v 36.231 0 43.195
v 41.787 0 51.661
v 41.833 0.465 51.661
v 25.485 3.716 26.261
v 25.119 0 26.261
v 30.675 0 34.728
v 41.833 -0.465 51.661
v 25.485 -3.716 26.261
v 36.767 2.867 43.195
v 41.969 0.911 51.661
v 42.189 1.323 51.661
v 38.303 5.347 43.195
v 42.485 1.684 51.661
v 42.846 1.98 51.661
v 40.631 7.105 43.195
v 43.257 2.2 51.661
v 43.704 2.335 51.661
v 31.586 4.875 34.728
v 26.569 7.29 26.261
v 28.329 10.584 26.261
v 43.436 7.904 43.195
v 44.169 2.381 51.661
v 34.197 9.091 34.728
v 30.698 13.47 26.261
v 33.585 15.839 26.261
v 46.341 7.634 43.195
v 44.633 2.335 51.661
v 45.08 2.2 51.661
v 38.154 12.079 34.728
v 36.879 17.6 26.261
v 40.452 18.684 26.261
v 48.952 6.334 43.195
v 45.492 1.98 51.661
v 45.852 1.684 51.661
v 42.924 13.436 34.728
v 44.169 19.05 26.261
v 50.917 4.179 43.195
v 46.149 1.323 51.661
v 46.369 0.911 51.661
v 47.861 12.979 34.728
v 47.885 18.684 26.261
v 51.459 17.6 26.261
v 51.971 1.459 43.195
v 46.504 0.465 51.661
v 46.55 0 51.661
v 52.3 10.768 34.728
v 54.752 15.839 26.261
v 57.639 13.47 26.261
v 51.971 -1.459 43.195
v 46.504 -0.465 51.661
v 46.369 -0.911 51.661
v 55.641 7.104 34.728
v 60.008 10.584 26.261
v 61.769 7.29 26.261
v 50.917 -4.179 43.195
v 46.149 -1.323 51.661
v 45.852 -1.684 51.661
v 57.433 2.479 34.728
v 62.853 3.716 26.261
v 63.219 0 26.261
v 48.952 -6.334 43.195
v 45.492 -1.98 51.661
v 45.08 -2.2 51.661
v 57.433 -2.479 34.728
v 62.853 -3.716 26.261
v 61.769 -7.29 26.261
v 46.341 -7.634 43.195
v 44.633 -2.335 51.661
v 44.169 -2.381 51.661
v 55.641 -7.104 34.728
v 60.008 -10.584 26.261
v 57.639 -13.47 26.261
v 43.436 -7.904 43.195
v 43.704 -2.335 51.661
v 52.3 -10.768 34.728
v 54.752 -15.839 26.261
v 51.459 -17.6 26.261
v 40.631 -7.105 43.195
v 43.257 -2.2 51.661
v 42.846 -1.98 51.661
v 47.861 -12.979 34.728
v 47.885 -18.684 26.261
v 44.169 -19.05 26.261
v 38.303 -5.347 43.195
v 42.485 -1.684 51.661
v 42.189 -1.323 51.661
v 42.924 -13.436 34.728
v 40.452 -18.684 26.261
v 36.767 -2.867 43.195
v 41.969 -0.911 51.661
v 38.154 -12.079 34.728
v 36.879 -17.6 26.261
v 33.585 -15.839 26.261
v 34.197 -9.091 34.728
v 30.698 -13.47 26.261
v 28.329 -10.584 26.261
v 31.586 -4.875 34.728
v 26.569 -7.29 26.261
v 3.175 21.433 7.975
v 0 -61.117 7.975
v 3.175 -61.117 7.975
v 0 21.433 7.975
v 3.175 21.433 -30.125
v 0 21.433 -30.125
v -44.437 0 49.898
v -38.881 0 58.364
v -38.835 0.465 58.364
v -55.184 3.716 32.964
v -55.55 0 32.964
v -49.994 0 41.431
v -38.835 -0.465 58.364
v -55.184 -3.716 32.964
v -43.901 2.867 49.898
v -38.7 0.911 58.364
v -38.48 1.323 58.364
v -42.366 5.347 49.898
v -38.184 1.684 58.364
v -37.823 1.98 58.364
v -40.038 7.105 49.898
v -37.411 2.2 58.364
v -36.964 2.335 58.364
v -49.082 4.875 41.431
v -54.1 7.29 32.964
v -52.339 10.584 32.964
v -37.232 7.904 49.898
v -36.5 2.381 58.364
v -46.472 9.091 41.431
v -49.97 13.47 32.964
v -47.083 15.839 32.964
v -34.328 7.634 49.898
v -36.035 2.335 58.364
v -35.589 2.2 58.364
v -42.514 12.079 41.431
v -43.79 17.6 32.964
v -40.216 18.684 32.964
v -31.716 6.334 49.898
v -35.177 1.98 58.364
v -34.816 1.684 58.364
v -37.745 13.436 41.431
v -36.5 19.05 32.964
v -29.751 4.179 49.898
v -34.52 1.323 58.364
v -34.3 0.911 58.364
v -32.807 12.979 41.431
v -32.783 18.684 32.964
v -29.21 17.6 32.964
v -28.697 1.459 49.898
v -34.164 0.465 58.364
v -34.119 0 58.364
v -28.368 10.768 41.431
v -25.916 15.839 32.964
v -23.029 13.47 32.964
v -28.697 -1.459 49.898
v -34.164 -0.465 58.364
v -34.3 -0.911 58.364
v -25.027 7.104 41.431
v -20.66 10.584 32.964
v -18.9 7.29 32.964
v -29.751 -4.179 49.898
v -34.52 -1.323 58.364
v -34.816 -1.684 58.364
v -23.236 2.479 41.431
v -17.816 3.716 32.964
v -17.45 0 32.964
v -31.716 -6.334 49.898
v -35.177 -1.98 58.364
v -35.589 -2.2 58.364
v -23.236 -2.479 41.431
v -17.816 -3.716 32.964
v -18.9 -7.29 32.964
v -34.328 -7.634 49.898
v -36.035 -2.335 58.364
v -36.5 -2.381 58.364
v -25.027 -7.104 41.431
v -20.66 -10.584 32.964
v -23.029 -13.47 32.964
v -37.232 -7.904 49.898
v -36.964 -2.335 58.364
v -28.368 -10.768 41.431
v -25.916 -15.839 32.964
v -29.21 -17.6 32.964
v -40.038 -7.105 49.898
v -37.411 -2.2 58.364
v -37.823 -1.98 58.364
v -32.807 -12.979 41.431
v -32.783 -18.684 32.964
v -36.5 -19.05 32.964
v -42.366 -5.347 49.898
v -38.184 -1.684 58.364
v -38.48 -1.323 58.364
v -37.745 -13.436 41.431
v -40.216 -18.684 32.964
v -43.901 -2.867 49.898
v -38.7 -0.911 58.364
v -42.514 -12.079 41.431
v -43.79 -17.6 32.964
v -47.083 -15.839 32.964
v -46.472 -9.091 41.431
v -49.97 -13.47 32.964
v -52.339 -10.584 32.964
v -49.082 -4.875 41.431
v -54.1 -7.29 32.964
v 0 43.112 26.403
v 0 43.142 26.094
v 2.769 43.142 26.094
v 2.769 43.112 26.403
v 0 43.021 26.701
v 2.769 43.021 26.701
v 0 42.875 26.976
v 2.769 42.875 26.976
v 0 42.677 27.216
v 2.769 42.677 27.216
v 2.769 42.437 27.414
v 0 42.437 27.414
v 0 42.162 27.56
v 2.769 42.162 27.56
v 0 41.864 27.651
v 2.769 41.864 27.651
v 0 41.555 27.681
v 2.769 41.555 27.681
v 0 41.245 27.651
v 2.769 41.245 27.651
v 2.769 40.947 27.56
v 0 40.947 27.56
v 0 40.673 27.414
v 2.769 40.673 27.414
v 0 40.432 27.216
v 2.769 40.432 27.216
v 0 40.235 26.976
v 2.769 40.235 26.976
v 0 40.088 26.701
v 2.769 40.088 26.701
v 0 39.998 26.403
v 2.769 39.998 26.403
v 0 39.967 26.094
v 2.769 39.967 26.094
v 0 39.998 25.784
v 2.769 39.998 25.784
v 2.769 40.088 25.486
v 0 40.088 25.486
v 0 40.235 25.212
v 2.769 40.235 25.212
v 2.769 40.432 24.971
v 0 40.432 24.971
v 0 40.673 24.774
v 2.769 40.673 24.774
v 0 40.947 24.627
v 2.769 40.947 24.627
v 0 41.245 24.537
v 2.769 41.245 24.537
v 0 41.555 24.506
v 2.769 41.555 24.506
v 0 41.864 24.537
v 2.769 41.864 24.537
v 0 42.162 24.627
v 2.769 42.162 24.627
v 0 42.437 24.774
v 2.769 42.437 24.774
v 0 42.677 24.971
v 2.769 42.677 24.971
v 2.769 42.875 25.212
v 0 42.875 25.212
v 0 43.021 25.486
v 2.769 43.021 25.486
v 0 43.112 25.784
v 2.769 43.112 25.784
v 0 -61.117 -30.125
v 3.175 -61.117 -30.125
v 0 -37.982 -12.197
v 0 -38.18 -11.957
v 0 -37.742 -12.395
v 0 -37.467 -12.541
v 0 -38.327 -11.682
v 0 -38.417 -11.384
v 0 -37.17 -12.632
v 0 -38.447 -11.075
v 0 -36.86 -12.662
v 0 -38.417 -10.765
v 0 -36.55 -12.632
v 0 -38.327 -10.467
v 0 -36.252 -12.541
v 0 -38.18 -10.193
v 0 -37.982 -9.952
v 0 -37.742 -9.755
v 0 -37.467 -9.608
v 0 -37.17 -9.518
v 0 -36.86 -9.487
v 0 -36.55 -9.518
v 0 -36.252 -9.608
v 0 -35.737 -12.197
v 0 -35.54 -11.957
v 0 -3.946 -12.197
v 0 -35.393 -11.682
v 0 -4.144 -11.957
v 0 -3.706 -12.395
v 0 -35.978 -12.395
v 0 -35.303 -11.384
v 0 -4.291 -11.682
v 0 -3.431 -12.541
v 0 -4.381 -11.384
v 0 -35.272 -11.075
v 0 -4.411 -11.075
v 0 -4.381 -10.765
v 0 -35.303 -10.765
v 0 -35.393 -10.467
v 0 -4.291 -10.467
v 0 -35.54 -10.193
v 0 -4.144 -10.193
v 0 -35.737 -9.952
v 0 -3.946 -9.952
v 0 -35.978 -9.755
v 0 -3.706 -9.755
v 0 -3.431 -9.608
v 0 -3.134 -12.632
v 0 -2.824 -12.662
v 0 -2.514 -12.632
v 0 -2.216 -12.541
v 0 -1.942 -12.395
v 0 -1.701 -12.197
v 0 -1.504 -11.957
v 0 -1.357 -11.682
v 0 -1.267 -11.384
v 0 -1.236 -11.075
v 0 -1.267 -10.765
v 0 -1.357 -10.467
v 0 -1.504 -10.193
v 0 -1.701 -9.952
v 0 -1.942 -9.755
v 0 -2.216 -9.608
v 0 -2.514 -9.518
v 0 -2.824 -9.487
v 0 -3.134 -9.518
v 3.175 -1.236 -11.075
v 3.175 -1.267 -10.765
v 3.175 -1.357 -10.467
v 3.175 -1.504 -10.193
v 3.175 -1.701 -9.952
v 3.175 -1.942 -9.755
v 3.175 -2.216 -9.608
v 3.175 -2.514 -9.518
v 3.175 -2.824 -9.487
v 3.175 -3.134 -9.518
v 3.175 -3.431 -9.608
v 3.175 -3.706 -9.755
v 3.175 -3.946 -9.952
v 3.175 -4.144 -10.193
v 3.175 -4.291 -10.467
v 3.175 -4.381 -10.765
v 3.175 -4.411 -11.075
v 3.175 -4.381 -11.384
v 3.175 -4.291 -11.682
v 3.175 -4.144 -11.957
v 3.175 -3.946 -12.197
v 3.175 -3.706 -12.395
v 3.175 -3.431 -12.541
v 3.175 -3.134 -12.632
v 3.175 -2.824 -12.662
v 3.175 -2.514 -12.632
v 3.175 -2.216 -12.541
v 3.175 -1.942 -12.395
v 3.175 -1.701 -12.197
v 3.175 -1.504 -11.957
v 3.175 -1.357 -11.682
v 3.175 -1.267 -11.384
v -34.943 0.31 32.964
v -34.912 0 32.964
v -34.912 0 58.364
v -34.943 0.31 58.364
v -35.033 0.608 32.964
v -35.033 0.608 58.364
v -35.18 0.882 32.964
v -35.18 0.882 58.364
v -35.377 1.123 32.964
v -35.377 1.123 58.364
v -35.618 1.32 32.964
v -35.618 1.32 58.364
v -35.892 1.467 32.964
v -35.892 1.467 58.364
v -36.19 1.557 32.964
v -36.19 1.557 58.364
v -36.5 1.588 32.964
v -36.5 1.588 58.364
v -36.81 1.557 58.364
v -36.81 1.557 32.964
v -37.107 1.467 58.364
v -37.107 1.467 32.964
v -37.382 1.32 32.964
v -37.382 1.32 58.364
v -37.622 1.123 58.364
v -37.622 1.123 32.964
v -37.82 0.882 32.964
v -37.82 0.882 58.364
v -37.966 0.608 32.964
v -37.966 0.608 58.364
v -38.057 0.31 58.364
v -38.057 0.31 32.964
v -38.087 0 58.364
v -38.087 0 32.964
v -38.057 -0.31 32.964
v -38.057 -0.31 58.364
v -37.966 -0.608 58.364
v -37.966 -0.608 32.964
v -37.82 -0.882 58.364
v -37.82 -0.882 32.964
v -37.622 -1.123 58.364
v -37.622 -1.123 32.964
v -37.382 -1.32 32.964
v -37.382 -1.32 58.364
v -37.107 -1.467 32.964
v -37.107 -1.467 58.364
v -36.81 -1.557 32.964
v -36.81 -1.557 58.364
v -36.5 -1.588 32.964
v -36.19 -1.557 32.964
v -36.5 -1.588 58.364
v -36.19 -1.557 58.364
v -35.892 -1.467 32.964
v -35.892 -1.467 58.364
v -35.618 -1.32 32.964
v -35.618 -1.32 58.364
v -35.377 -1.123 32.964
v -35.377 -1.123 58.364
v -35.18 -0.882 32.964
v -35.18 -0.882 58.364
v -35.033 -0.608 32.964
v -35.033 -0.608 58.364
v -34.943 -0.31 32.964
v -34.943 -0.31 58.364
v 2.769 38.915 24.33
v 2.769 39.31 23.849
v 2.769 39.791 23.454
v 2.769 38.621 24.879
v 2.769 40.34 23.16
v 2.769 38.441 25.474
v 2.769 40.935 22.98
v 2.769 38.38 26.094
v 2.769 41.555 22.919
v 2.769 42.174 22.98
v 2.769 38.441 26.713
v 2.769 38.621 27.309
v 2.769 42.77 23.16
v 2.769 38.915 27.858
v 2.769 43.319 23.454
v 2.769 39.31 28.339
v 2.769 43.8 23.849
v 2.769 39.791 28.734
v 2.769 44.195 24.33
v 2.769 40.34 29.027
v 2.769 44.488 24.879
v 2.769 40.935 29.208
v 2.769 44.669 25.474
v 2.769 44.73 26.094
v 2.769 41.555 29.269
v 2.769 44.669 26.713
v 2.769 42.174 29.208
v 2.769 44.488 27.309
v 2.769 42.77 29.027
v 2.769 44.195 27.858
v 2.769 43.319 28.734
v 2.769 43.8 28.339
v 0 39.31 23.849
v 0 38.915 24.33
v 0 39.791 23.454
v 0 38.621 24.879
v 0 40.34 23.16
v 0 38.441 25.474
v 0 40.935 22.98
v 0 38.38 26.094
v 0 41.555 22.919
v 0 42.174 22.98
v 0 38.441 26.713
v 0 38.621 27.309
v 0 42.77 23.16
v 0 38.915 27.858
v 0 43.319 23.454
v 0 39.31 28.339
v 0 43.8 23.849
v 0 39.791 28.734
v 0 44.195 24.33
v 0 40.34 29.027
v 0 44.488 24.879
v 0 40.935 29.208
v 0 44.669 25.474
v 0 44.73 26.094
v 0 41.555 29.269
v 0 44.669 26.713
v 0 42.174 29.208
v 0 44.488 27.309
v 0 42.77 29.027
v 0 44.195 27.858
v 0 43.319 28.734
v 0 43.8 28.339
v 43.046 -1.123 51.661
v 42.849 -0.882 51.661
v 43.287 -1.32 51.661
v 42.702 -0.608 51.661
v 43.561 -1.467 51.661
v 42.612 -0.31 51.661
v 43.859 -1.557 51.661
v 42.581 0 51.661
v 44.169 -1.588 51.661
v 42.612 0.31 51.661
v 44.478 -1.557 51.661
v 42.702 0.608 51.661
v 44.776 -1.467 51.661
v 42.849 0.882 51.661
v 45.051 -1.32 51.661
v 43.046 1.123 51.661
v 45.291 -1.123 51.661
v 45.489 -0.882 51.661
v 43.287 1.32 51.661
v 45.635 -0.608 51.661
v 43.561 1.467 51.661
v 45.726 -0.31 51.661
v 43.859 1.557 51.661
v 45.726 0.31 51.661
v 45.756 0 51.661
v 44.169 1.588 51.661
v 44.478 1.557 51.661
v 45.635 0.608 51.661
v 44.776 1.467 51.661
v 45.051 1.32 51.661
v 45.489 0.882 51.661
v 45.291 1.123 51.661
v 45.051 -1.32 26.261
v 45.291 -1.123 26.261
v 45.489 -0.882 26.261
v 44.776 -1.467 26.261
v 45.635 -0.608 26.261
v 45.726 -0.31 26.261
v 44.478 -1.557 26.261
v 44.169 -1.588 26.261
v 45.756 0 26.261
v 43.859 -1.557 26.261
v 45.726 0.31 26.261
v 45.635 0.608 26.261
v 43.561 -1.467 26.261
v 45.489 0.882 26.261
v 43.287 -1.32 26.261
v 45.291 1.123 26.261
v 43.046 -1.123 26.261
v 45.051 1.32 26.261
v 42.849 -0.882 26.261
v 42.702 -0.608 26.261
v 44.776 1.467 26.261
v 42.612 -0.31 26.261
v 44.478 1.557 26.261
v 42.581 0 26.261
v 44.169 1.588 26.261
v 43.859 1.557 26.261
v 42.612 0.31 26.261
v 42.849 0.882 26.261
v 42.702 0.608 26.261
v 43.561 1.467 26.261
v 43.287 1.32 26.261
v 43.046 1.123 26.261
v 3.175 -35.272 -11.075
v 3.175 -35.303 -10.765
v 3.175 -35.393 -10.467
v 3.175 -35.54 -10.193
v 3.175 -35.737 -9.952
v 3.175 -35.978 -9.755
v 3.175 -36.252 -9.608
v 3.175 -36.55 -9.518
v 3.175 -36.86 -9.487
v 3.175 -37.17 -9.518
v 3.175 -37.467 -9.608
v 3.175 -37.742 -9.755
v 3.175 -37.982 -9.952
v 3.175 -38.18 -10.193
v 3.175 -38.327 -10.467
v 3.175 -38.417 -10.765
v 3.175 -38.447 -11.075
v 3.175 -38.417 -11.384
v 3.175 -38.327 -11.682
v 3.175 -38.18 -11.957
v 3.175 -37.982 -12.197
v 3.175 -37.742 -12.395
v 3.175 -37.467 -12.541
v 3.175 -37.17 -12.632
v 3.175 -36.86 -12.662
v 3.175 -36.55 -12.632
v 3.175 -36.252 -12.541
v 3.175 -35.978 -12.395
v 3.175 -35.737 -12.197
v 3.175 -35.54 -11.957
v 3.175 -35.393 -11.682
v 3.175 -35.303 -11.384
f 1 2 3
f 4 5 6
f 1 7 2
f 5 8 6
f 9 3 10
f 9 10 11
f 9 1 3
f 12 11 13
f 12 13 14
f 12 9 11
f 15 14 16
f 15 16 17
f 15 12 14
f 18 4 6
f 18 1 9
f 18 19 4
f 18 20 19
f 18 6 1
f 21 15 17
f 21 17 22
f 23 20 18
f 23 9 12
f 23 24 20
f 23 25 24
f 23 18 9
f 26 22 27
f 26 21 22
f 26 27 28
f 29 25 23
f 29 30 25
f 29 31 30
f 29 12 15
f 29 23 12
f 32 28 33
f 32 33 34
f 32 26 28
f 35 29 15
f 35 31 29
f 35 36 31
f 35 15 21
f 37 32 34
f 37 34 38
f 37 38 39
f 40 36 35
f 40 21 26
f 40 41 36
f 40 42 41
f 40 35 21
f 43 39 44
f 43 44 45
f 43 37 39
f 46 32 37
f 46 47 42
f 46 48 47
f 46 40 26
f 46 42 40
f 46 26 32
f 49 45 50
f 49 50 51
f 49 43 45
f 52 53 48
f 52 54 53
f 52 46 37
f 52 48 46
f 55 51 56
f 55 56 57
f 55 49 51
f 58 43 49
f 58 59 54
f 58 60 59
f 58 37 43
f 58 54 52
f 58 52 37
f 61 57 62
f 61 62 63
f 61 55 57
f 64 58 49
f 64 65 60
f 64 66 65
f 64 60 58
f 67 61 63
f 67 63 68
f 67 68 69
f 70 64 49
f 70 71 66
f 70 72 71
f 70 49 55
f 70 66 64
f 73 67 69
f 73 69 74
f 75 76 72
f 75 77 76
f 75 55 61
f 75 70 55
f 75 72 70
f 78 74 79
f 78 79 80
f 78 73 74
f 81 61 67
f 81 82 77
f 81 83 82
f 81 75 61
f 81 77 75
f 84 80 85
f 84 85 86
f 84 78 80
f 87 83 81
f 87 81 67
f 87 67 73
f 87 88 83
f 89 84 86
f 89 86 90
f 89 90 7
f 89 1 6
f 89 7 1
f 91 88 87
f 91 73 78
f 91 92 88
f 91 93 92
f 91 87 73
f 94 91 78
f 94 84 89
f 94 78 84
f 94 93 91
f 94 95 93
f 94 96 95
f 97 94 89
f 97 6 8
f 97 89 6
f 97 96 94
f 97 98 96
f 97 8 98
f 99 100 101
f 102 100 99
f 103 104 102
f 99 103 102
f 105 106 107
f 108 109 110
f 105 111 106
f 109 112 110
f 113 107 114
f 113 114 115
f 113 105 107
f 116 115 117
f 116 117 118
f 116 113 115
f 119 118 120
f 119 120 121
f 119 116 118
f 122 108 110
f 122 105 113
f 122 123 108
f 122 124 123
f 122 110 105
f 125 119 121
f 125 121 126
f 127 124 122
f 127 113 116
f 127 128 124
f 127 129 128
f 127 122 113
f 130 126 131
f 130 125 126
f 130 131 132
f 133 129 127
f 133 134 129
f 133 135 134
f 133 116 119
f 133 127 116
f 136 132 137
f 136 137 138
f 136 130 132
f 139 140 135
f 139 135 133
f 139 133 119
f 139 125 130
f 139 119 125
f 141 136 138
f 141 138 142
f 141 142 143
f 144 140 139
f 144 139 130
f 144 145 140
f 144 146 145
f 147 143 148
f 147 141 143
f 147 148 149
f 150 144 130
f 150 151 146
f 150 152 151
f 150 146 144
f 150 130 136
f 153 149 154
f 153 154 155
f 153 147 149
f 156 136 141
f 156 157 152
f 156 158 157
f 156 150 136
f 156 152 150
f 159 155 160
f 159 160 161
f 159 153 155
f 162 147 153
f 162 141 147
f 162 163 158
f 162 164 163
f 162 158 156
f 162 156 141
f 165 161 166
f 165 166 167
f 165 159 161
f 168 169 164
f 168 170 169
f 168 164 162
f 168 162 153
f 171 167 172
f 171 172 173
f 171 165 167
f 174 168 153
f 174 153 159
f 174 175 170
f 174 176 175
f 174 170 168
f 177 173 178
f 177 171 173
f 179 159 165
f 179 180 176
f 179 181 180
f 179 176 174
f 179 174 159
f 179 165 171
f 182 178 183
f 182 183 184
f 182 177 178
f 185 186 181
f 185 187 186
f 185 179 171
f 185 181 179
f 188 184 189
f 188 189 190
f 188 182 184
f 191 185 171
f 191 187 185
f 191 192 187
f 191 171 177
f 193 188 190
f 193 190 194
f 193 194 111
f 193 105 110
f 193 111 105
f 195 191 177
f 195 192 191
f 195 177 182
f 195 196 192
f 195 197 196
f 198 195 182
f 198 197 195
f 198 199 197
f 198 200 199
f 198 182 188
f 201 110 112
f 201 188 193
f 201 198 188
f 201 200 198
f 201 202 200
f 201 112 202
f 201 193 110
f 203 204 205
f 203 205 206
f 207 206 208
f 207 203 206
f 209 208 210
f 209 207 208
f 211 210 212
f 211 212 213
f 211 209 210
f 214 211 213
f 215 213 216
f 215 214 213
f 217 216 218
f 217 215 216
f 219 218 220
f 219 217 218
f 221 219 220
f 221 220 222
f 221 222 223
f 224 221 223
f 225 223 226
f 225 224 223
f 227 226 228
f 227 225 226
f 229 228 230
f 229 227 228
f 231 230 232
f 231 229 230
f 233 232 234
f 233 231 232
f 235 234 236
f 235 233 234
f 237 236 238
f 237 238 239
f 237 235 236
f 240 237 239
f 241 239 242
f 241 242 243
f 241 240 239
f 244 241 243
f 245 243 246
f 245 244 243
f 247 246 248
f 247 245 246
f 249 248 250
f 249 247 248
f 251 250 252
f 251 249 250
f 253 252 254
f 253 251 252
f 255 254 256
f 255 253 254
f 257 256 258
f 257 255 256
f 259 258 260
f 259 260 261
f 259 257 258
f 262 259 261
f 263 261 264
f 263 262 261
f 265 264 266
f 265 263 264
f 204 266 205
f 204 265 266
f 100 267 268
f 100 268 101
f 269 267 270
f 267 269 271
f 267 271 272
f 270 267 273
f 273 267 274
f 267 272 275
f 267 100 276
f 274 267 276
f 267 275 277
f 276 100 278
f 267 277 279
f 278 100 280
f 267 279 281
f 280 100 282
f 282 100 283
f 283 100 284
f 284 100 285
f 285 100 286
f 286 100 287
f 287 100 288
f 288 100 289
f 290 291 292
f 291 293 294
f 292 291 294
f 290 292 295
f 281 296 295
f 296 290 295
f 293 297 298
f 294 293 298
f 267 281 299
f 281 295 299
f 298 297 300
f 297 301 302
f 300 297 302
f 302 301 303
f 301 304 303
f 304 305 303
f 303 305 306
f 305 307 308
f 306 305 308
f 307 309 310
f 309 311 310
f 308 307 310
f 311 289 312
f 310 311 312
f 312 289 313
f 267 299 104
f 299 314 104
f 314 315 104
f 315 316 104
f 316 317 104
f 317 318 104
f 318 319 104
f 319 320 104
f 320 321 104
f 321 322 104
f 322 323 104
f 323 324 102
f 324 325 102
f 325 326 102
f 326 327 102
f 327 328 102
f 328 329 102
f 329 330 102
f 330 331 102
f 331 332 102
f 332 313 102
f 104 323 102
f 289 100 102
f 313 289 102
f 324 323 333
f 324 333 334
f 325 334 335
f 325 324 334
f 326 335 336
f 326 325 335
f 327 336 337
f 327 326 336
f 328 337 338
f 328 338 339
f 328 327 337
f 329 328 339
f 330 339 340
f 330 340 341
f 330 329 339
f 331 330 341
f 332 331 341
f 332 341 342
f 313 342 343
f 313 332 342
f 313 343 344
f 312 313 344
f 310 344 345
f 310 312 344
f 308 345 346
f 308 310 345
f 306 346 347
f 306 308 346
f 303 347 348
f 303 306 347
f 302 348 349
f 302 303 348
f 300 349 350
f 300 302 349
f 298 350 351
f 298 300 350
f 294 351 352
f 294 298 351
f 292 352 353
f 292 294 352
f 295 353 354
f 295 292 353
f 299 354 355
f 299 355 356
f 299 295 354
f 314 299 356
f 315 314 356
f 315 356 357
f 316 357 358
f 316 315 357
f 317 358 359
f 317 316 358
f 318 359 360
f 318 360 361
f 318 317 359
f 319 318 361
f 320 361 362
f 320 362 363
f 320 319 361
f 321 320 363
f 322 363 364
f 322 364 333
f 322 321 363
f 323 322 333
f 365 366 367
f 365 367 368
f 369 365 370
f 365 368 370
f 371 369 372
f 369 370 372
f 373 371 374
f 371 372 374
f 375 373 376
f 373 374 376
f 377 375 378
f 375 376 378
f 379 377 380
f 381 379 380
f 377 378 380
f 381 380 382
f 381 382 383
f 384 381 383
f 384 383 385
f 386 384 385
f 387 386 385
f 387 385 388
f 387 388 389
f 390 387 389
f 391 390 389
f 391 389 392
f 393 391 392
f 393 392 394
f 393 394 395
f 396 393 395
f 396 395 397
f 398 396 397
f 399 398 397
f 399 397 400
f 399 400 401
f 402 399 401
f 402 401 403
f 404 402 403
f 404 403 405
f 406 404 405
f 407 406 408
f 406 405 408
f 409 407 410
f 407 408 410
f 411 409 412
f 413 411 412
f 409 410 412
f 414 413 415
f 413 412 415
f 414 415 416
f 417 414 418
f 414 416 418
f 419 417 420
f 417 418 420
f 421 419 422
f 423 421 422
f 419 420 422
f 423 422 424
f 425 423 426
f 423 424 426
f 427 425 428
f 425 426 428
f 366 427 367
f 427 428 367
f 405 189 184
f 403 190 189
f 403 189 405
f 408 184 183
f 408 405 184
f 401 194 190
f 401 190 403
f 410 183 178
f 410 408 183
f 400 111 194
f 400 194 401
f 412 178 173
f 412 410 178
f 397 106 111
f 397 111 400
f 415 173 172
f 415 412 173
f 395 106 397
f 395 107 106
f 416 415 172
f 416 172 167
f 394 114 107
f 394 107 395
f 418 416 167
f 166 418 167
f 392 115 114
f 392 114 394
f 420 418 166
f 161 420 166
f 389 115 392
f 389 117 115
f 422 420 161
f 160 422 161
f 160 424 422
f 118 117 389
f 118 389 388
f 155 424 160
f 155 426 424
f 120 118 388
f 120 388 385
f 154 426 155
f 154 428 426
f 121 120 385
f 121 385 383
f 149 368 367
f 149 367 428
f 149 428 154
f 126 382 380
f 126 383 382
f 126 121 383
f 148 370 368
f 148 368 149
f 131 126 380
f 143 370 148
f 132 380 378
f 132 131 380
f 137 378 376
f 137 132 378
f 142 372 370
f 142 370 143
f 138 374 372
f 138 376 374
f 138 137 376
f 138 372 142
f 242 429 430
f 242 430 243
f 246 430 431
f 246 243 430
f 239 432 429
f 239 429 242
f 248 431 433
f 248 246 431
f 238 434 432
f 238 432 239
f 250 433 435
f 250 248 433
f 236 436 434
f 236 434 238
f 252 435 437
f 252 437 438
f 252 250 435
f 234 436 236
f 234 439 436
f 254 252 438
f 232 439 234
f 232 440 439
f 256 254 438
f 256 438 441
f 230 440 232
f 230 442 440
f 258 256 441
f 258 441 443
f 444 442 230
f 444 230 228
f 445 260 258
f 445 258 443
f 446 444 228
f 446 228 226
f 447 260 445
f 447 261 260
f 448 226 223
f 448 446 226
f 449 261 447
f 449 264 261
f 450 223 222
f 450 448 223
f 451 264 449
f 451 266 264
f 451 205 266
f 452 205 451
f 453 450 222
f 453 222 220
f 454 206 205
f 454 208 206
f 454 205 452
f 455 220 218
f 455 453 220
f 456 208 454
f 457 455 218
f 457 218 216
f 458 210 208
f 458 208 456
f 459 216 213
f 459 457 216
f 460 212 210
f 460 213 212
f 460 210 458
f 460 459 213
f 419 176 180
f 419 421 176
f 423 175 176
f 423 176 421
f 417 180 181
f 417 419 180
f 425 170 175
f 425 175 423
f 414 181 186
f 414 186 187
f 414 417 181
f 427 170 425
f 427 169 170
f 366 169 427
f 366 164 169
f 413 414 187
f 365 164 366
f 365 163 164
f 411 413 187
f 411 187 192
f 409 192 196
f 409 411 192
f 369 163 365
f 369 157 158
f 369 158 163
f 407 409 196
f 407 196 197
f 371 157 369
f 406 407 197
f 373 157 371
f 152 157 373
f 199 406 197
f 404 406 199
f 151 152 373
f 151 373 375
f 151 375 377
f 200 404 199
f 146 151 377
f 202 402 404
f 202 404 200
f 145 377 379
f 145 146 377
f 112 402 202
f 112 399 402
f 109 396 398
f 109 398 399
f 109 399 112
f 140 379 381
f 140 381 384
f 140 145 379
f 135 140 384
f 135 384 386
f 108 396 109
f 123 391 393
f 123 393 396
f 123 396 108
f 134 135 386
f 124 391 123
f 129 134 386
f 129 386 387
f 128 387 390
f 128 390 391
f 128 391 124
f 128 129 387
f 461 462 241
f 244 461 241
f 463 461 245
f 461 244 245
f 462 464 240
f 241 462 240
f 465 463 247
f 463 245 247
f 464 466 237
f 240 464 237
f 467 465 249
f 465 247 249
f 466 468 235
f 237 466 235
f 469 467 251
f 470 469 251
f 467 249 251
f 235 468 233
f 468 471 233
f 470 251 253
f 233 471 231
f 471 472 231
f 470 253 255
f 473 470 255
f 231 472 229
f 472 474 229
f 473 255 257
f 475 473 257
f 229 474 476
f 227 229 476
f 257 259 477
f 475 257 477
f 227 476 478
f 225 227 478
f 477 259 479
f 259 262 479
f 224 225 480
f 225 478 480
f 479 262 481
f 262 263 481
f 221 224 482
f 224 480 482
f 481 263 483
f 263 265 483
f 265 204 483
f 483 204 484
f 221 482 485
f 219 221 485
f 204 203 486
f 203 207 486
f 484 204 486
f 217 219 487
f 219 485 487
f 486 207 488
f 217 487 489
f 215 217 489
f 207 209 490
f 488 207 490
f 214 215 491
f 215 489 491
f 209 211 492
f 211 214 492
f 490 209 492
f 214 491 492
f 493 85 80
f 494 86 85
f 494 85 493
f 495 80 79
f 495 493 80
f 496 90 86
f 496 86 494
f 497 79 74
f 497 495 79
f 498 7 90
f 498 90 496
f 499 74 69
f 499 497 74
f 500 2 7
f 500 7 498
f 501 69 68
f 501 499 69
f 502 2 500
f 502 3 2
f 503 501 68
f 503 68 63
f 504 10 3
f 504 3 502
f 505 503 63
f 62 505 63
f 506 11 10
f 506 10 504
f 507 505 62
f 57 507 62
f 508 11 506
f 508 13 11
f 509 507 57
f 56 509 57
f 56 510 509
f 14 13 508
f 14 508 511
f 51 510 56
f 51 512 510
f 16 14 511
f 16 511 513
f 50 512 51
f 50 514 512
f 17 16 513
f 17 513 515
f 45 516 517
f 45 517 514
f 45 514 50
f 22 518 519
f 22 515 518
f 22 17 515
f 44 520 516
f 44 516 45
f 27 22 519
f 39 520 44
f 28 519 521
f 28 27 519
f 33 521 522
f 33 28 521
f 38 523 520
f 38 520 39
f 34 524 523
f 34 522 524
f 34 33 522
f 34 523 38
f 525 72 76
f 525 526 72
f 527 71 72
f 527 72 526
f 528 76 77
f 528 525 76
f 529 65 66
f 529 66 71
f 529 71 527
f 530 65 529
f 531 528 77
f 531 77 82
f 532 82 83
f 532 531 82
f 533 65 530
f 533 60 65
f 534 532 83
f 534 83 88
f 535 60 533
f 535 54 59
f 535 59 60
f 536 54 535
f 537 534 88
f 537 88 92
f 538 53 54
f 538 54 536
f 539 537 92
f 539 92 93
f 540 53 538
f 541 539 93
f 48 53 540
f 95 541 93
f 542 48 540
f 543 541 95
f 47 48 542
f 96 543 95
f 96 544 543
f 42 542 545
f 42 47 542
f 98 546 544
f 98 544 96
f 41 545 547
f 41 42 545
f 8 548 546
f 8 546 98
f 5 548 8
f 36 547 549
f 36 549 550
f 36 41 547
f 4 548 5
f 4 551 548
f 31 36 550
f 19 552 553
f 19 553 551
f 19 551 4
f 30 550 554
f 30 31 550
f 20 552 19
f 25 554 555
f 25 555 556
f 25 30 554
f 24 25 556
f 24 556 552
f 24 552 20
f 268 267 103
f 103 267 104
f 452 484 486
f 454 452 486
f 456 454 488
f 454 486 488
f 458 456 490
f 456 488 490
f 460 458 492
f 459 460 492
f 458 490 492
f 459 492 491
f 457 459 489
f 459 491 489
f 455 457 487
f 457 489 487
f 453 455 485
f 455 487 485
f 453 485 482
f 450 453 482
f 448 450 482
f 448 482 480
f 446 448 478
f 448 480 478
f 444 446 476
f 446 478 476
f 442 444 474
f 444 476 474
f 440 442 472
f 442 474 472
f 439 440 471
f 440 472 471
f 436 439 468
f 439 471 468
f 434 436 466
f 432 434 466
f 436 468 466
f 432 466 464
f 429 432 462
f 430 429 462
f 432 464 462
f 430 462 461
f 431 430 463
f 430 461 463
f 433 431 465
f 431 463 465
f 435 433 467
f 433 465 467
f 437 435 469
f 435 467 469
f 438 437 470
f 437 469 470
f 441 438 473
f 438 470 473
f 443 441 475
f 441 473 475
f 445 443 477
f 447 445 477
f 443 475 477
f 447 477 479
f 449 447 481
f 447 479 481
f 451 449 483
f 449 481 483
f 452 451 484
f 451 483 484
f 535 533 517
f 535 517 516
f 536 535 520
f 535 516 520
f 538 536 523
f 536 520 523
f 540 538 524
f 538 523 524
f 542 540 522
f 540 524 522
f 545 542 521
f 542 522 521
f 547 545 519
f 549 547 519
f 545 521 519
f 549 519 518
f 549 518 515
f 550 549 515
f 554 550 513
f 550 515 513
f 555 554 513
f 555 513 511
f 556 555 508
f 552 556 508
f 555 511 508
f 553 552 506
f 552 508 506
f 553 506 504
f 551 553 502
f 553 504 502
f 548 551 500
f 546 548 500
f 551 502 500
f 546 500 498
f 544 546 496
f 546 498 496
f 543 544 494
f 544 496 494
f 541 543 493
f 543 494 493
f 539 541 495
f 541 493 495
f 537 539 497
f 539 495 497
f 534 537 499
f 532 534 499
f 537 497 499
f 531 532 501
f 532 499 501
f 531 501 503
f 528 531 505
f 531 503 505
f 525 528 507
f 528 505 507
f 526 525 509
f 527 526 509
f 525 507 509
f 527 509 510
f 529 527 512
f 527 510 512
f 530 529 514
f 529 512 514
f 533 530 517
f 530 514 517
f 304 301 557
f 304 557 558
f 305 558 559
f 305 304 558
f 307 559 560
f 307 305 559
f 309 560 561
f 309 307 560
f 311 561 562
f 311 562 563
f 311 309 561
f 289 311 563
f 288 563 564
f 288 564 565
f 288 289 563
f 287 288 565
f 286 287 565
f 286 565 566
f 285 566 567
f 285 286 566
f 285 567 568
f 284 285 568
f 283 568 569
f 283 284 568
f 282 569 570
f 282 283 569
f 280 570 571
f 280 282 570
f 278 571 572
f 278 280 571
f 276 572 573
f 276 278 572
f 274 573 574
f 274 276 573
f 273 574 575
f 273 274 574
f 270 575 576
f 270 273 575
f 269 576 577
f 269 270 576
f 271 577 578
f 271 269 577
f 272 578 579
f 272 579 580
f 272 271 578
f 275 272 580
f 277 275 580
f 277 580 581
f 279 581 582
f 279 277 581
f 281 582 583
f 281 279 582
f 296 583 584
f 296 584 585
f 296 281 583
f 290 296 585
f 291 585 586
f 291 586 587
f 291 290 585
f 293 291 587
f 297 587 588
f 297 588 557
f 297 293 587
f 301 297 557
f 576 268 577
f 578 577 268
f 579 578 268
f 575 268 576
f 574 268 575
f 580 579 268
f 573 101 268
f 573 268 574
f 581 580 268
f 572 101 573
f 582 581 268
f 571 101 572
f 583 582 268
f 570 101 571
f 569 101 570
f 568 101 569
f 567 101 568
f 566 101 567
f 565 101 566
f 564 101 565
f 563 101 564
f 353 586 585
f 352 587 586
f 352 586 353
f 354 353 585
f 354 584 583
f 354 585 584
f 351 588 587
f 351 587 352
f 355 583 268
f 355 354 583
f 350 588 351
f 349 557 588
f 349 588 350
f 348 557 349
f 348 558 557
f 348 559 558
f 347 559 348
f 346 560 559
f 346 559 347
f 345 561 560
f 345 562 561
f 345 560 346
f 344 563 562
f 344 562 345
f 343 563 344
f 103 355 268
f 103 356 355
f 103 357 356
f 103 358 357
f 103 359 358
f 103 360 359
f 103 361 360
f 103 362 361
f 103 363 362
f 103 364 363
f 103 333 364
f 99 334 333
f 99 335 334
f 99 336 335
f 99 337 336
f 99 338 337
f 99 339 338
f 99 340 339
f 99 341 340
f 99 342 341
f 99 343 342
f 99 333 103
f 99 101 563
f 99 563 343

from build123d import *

# Parameters (mm, degrees)
F3_R      = 1.5875
F4_DEPTH  = 25.908
F5_R      = 1.5875
F6_DEPTH  = 25.4
F7_R      = 3.175
F7_R_2    = 1.5875
F8_DEPTH  = 2.7686
F9_W      = 82.55
F9_H      = 38.1
F9_R      = 1.5875
F10_DEPTH = 3.175


with BuildPart() as f1:
    # F0 (on Front) → F1 (revolve)
    with BuildSketch(Plane.XZ):
        Polygon((-36.499815, 58.364228), (-38.881065, 58.364228), (-55.549815, 32.964228), (-36.499815, 32.964228), align=None)
    revolve(axis=Axis((-36.499815, 0, 45.664228), (0, 0, -1)))

    # F3 (on face) → F4 (cut)
    with BuildSketch(Plane.XY.offset(58.364228)):
        with Locations((-36.499815, 0)):
            Circle(F3_R)
    extrude(amount=-F4_DEPTH, mode=Mode.SUBTRACT)


with BuildPart() as f2:
    # F0 (on Front) → F2 (revolve)
    with BuildSketch(Plane.XZ):
        Polygon((44.168683, 26.261346), (44.168683, 51.661346), (41.787433, 51.661346), (25.118683, 26.261346), align=None)
    revolve(axis=Axis((44.168683, 0, 38.961346), (0, 0, -1)))

    # F5 (on face) → F6 (cut)
    with BuildSketch(Plane.XY.offset(51.661346)):
        with Locations((44.168683, 0)):
            Circle(F5_R)
    extrude(amount=-F6_DEPTH, mode=Mode.SUBTRACT)


with BuildPart() as f8:
    # F7 (on Right) → F8 (new body)
    with BuildSketch(Plane.YZ):
        with Locations((41.554622, 26.093636)):
            Circle(F7_R)
        with Locations((41.554622, 26.093636)):
            Circle(F7_R_2, mode=Mode.SUBTRACT)
    extrude(amount=F8_DEPTH)


with BuildPart() as f10:
    # F9 (on Right) → F10 (new body)
    with BuildSketch(Plane.YZ):
        with Locations((-19.841883, -11.074597)):
            Rectangle(F9_W, F9_H)
        with Locations((-36.859883, -11.074597)):
            Circle(F9_R, mode=Mode.SUBTRACT)
        with Locations((-2.823883, -11.074597)):
            Circle(F9_R, mode=Mode.SUBTRACT)
    extrude(amount=F10_DEPTH)


solid = Compound([f1.part, f2.part, f8.part, f10.part])
